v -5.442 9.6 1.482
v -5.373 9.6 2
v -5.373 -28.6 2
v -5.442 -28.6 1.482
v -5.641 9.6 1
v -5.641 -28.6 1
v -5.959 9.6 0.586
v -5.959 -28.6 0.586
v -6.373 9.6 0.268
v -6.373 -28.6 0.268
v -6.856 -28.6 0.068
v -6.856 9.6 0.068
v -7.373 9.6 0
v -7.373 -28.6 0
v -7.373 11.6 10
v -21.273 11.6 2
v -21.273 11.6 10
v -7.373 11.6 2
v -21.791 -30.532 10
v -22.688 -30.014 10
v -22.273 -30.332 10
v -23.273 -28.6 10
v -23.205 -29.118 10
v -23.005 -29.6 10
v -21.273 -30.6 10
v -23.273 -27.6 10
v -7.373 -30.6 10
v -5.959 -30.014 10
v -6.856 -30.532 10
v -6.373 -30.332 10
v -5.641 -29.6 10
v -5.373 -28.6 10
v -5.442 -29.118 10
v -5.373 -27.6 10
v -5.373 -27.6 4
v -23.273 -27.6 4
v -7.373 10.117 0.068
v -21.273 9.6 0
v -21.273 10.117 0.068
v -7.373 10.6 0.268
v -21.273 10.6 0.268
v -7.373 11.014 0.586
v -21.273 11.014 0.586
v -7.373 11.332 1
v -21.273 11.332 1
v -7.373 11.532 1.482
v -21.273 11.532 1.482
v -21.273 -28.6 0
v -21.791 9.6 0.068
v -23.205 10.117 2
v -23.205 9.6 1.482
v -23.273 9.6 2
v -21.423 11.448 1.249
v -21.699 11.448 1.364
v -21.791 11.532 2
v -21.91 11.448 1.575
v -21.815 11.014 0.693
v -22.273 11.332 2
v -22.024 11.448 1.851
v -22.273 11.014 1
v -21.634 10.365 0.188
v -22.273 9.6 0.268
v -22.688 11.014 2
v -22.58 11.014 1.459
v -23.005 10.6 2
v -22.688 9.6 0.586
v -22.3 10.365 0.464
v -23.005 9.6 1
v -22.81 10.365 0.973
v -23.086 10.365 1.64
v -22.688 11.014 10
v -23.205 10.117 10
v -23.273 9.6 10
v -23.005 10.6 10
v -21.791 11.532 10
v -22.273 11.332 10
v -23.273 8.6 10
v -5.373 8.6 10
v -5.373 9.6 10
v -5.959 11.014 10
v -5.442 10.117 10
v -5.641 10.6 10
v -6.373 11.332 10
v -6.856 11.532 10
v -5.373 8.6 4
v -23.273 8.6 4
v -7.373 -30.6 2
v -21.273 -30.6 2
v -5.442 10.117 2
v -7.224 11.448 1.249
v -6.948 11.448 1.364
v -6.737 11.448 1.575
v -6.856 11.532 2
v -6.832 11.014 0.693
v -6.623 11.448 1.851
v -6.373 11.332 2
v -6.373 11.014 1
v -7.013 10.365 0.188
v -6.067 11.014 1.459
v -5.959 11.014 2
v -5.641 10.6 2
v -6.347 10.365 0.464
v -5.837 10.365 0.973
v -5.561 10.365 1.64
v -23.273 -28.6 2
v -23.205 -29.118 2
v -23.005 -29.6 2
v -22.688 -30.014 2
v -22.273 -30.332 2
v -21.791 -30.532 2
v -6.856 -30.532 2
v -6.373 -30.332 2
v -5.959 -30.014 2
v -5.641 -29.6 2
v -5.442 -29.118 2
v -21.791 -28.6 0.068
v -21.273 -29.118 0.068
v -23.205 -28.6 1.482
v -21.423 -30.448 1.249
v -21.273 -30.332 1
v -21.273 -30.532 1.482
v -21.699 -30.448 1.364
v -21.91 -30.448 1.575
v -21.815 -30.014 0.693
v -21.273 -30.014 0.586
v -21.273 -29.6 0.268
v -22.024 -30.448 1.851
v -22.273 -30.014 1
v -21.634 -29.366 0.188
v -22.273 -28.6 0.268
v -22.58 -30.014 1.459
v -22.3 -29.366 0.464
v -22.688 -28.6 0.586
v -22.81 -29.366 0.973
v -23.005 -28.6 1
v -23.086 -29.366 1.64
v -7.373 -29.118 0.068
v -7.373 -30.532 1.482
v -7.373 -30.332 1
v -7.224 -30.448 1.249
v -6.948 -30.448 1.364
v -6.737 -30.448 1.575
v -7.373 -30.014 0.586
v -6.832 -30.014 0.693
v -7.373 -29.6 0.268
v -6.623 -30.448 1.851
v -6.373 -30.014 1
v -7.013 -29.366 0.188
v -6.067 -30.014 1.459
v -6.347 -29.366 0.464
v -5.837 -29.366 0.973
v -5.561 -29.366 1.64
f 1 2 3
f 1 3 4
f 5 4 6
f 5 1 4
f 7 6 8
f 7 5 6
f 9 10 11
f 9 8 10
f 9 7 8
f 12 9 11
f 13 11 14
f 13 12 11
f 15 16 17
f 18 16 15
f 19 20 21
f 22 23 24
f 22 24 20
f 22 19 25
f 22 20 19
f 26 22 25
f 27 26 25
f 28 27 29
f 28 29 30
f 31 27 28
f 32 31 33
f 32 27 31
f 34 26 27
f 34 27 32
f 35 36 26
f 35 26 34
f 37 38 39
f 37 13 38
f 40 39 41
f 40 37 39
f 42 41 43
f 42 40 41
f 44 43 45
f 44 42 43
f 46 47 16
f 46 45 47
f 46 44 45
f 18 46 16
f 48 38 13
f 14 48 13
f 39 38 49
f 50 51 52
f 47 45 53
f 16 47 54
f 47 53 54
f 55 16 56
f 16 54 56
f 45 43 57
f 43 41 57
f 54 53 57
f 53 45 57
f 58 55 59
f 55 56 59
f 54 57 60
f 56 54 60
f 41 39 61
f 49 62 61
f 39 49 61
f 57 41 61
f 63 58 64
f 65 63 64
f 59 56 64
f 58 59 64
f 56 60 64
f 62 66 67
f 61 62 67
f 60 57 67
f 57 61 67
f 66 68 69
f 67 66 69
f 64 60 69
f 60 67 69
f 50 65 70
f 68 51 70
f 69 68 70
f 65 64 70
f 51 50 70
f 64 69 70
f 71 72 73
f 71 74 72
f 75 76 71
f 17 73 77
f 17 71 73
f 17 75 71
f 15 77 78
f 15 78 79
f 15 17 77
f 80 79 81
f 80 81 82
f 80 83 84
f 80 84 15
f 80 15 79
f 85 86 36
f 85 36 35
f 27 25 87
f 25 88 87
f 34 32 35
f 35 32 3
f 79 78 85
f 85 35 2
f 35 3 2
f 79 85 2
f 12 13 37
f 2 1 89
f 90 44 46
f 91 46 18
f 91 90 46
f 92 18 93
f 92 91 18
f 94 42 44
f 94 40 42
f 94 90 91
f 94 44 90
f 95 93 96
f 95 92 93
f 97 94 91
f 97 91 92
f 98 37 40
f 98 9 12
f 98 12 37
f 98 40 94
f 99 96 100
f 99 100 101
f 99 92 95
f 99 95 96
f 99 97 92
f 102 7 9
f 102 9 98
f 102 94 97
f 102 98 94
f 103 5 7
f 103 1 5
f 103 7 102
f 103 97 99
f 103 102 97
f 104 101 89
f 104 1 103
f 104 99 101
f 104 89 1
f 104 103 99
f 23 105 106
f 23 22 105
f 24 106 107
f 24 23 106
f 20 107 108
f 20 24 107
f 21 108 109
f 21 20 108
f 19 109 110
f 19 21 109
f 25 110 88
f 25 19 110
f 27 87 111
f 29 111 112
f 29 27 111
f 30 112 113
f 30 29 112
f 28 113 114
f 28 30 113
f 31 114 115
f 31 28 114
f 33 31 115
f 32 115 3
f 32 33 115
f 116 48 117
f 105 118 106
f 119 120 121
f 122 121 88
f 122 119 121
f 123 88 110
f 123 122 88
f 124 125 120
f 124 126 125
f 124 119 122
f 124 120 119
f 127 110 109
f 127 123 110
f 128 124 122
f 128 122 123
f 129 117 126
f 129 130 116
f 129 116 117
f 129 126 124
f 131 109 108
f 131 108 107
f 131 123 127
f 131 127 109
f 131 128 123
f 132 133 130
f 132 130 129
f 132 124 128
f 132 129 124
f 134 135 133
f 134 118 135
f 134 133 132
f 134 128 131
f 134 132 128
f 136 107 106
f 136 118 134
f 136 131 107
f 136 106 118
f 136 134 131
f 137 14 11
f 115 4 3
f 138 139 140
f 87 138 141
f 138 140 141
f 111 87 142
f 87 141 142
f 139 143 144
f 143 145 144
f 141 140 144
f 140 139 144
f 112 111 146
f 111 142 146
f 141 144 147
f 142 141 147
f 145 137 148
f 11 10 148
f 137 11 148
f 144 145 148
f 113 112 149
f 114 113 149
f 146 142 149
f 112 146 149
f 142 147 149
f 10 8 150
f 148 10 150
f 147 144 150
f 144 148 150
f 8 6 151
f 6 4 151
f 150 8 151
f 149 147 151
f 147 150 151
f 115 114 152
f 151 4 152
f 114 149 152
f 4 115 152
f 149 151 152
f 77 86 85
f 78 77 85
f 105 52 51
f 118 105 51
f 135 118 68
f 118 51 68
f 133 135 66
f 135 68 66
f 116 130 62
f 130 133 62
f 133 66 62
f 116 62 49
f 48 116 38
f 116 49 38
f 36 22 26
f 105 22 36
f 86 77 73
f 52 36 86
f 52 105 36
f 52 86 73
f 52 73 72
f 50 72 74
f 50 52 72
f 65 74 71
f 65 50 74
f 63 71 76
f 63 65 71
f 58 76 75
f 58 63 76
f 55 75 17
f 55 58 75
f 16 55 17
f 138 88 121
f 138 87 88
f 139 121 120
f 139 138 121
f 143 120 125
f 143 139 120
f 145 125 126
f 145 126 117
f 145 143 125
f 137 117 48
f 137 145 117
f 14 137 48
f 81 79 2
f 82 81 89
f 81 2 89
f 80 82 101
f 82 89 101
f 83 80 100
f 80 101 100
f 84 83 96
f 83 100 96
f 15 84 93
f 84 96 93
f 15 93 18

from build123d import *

# Parameters (mm, degrees)
F0_W     = 17.9
F0_H     = 42.2
F1_DEPTH = 4
F2_W     = 17.9
F2_H     = 3
F3_DEPTH = 6
F4_W     = 17.9
F4_H     = 3
F5_DEPTH = 6
F6_R     = 2


with BuildPart() as f1:
    # F0 (on Top) → F1 (new body)
    with BuildSketch(Plane.XY):
        with Locations((-14.323435, -9.50025)):
            Rectangle(F0_W, F0_H)
    extrude(amount=F1_DEPTH)

    # F2 (on face) → F3 (join)
    with BuildSketch(Plane.XY.offset(4)):
        with Locations((-14.323435, 10.09975)):
            Rectangle(F2_W, F2_H)
    extrude(amount=F3_DEPTH)

    # F4 (on face) → F5 (join)
    with BuildSketch(Plane.XY.offset(4)):
        with Locations((-14.323435, -29.10025)):
            Rectangle(F4_W, F4_H)
    extrude(amount=F5_DEPTH)

    # F6
    f6_edges = [f1.edges().sort_by_distance(p)[0] for p in [
        (-23.273435, -9.50025, 0),
        (-5.373435, -9.50025, 0),
        (-14.323435, 11.59975, 0),
        (-14.323435, -30.60025, 0),
        (-5.373435, 11.59975, 5),
        (-23.273435, 11.59975, 5),
        (-5.373435, -30.60025, 5),
        (-23.273435, -30.60025, 5),
    ]]
    fillet(f6_edges, radius=F6_R)


solid = f1.part
